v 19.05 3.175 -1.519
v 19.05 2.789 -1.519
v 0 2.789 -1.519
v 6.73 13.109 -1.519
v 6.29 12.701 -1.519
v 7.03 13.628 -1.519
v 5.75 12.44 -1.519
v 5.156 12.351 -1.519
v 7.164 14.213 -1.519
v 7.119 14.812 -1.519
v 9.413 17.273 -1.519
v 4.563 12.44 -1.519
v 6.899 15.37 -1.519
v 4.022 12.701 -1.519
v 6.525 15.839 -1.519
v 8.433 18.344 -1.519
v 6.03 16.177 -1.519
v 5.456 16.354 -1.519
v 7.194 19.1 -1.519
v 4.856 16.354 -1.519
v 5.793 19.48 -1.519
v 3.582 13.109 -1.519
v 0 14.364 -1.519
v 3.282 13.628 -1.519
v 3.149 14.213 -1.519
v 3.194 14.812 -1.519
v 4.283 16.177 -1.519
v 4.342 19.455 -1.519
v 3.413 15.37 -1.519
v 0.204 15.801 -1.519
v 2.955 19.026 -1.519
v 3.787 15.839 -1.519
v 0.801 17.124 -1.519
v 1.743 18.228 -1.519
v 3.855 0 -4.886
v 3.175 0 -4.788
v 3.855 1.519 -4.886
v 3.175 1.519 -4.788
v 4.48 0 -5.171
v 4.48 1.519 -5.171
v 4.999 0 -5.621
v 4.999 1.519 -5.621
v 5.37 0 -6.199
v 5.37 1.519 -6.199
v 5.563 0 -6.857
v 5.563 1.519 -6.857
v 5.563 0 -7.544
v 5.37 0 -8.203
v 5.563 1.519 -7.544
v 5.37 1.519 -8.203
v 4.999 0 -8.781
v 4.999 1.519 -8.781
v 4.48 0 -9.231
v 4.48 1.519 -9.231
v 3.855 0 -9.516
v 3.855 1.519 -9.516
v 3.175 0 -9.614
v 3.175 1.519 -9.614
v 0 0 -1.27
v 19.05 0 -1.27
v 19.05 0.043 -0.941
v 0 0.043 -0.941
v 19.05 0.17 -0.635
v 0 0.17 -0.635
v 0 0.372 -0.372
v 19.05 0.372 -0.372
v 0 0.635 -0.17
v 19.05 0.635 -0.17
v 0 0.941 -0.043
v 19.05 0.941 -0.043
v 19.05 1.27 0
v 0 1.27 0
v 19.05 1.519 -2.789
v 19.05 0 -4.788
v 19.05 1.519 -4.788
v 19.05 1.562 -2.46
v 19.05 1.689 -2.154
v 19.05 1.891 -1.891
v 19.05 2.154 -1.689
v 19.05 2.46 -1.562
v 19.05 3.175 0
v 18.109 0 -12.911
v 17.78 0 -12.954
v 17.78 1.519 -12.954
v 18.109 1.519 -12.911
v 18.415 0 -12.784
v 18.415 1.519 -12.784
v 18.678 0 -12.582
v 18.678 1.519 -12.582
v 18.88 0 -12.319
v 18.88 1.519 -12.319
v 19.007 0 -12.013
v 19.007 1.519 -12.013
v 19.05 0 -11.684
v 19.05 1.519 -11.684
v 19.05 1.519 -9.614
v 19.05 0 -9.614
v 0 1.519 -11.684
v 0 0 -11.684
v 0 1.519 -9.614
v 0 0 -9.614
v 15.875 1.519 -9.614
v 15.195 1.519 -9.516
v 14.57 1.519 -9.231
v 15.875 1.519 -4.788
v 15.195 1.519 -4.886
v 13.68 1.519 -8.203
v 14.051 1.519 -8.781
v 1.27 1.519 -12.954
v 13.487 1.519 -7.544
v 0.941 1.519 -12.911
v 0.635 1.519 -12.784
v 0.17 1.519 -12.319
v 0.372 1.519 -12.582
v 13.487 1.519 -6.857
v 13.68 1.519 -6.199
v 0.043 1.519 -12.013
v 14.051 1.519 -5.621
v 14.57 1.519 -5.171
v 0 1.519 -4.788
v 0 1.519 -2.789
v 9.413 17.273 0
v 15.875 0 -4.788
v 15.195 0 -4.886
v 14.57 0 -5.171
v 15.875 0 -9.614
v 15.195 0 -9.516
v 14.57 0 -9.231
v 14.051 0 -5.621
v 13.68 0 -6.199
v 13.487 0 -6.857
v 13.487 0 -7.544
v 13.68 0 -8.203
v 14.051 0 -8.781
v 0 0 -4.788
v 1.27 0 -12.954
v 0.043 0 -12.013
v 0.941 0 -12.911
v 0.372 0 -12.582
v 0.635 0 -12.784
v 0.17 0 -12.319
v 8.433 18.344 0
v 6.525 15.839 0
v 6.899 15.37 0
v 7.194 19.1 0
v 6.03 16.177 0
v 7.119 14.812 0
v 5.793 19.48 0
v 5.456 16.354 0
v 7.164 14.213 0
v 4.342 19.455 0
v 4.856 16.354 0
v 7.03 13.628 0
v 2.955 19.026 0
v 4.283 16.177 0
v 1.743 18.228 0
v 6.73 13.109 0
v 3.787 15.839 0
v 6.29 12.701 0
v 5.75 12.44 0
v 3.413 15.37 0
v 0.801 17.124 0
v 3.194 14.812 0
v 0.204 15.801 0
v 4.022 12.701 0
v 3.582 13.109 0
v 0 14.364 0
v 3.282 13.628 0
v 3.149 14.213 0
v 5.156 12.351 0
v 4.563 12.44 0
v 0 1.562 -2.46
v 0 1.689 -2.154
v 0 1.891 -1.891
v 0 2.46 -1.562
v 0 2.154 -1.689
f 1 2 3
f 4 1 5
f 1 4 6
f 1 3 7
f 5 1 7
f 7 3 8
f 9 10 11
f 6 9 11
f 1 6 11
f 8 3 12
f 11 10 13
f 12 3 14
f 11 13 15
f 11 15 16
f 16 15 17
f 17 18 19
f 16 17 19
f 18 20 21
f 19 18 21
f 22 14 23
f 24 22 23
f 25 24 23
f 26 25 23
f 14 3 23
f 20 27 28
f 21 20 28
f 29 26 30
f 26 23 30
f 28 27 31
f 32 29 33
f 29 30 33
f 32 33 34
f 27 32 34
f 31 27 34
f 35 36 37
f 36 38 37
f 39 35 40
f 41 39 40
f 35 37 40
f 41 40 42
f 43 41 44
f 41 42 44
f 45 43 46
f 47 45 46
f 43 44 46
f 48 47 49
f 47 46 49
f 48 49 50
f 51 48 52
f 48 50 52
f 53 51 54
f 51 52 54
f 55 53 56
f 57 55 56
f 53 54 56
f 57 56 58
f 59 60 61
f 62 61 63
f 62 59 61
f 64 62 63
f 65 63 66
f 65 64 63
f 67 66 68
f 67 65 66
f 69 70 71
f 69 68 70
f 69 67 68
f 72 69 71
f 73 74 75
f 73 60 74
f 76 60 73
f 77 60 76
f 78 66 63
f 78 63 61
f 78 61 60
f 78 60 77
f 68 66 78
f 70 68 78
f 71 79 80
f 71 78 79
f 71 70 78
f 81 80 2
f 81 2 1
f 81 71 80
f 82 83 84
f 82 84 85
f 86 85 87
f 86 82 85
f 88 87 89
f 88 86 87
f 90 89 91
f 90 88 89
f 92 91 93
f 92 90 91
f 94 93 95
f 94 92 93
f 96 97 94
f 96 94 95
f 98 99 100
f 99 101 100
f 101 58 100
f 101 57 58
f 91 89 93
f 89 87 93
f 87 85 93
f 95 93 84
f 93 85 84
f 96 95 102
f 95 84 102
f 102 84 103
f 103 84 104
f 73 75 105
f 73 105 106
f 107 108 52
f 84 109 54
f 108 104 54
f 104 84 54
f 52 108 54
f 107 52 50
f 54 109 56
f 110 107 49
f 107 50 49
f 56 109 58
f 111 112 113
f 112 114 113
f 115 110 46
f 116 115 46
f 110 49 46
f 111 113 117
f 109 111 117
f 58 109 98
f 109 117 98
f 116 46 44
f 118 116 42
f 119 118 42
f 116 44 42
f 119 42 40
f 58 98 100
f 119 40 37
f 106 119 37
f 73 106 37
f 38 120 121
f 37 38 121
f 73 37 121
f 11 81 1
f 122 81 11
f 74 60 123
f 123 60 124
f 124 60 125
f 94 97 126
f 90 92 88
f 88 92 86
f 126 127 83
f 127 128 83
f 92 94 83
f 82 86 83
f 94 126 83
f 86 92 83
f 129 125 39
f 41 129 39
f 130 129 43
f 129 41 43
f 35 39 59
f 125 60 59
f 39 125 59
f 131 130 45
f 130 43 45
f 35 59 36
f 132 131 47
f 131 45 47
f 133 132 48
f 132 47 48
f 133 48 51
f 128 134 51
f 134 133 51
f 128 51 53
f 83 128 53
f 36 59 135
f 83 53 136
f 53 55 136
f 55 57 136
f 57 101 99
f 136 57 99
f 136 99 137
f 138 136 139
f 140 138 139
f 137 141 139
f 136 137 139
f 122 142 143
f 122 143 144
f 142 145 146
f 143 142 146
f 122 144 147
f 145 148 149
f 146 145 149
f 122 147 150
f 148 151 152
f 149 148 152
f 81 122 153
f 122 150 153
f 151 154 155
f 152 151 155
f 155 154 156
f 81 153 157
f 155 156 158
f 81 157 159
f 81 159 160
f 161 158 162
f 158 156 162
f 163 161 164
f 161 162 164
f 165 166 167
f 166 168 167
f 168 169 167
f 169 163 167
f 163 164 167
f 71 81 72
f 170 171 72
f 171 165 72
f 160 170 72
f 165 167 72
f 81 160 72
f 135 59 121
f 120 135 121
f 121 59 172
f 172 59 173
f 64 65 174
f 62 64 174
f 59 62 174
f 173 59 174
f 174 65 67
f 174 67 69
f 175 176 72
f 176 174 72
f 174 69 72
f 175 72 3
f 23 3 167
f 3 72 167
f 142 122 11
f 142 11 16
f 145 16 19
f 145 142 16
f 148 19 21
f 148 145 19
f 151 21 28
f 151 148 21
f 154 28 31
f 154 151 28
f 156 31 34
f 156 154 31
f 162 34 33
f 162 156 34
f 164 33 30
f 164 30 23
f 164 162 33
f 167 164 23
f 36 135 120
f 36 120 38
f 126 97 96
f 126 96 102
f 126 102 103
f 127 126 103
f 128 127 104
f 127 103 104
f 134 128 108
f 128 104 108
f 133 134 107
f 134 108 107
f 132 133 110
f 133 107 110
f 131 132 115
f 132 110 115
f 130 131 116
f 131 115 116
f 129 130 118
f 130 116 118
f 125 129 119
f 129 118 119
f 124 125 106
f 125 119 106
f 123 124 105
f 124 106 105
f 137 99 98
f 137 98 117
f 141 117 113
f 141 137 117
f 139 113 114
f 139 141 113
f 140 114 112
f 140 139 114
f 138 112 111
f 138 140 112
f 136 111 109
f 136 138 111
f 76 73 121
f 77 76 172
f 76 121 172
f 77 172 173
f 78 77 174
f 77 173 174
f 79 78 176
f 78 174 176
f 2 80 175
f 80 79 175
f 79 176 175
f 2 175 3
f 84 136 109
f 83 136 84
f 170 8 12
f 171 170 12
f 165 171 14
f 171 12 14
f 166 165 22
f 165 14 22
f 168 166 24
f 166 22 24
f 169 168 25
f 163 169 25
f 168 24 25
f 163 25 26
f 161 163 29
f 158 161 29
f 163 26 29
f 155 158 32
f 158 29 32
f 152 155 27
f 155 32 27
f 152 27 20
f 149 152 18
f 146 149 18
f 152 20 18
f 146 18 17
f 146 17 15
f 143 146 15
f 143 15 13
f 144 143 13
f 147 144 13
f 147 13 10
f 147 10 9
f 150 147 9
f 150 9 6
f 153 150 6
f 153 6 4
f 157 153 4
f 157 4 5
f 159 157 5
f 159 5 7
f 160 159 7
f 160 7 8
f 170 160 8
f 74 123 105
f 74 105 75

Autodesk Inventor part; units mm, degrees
sketch "Sketch_1" plane through (0, 0, 0) normal (1, 0, 0) x (0, 1, 0)
  line L0 (19.558, 0) -> (1.27, 0)
  arc A0 (1.27, 0) -> (0, -1.27) centre (1.27, -1.27) ccw
  line L1 (0, -1.27) -> (0, -12.954)
  line L2 (0, -12.954) -> (1.5189, -12.954)
  line L3 (1.5189, -12.954) -> (1.5189, -2.7889)
  arc A1 (2.7889, -1.5189) -> (1.5189, -2.7889) centre (2.7889, -2.7889) ccw
  line L4 (2.7889, -1.5189) -> (19.558, -1.5189)
  line L5 (19.558, -1.5189) -> (19.558, 0)
extrude "Extrusion1" add sketch "Sketch_1" along normal blind 19.05
sketch "Sketch_2" plane through (0, 0, 0) normal (0, 0, 1) x (1, 0, 0)
  line L0 (-19.05, -19.558) -> (28.575, -19.558)
  line L1 (28.575, -19.558) -> (28.575, 29.337)
  line L2 (28.575, 29.337) -> (-19.05, 29.337)
  line L3 (-19.05, 29.337) -> (-19.05, -19.558)
  line L4 (0, 0) -> (19.05, 0)
  line L5 (19.05, 0) -> (19.05, 3.175)
  line L6 (19.05, 3.175) -> (9.4129, 17.2734)
  arc A0 (9.4129, 17.2734) -> (0, 14.3637) centre (5.1562, 14.3637) ccw
  line L7 (0, 14.3637) -> (0, 0)
extrude "Extrusion2" cut sketch "Sketch_2" against normal blind 12.954
sketch "Sketch3" plane through (0, 1.27, 0) normal (0, 0, 1) x (1, 0, 0)
  point P0 (5.1562, 13.0937)
hole "Hole1" at (5.1562, 14.3637, 0) direction (0, 0, -1) diameter 4.0259 depth 1.5189
sketch "Sketch4" plane through (0, 0, -12.954) normal (0, -1, 0) x (1, 0, 0)
  point P0 (3.175, 5.7531)
hole "Hole2" at (3.175, 0, -7.2009) direction (0, 1, 0) diameter 4.826 depth 1.5189
sketch "Sketch5" plane through (0, 0, -12.954) normal (0, -1, 0) x (1, 0, 0)
  point P0 (15.875, 5.7531)
hole "Hole3" at (15.875, 0, -7.2009) direction (0, 1, 0) diameter 4.826 depth 1.5189
sketch "Sketch_6" plane through (0, 0, 0) normal (0, 1, 0) x (-1, 0, 0)
  line L0 (0, -9.6139) -> (0, -4.7879)
  line L1 (0, -4.7879) -> (-3.175, -4.7879)
  line L2 (-3.175, -4.7879) -> (-3.175, -9.6139)
  line L3 (-3.175, -9.6139) -> (0, -9.6139)
sketch "Sketch_7" plane through (0, 0, 0) normal (0, 1, 0) x (-1, 0, 0)
  line L0 (-15.875, -9.6139) -> (-15.875, -4.7879)
  line L1 (-15.875, -4.7879) -> (-19.05, -4.7879)
  line L2 (-19.05, -4.7879) -> (-19.05, -9.6139)
  line L3 (-19.05, -9.6139) -> (-15.875, -9.6139)
extrude "Extrusion3" cut sketch "Sketch_6" along normal blind 1.5189
extrude "Extrusion4" cut sketch "Sketch_7" along normal blind 1.5189
sketch "Sketch_8" plane through (0, 0, 0) normal (0, 1, 0) x (-1, 0, 0)
  line L0 (0, -19.431) -> (0, -11.684)
  arc A0 (-1.27, -12.954) -> (0, -11.684) centre (-1.27, -11.684) ccw
  line L1 (-1.27, -12.954) -> (-17.78, -12.954)
  arc A1 (-19.05, -11.684) -> (-17.78, -12.954) centre (-17.78, -11.684) ccw
  line L2 (-19.05, -11.684) -> (-19.05, -19.431)
  line L3 (-19.05, -19.431) -> (0, -19.431)
extrude "Extrusion5" cut sketch "Sketch_8" along normal blind 1.5189
ref_plane "c2_XY" through (0, 0, 0) normal (1, 0, 0) x (0, 0, -1)
ref_plane "c2_YZ" through (0, 0, 0) normal (0, 0, -1) x (0, 1, 0)
ref_plane "c2_ZX" through (0, 0, 0) normal (0, 1, 0) x (1, 0, 0)
ref_plane "k2_XY" through (0, 0, -12.954) normal (1, 0, 0) x (0, 0, -1)
ref_plane "k2_YZ" through (0, 0, -12.954) normal (0, 0, -1) x (0, 1, 0)
ref_plane "k2_ZX" through (0, 0, -12.954) normal (0, 1, 0) x (1, 0, 0)
ref_plane "to_dummy_R_XY" through (0, 0, 0) normal (0, 0, 1) x (1, 0, 0)
ref_plane "to_dummy_R_YZ" through (0, 0, 0) normal (1, 0, 0) x (0, 1, 0)
ref_plane "to_dummy_R_ZX" through (0, 0, 0) normal (0, 1, 0) x (0, 0, 1)
ref_plane "to_pin_R_XY" through (5.1562, 14.3637, 0) normal (0, 0, 1) x (1, 0, 0)
ref_plane "to_pin_R_YZ" through (5.1562, 14.3637, 0) normal (1, 0, 0) x (0, 1, 0)
ref_plane "to_pin_R_ZX" through (5.1562, 14.3637, 0) normal (0, 1, 0) x (0, 0, 1)
properties part number "D-782_pin" material "Steel"
